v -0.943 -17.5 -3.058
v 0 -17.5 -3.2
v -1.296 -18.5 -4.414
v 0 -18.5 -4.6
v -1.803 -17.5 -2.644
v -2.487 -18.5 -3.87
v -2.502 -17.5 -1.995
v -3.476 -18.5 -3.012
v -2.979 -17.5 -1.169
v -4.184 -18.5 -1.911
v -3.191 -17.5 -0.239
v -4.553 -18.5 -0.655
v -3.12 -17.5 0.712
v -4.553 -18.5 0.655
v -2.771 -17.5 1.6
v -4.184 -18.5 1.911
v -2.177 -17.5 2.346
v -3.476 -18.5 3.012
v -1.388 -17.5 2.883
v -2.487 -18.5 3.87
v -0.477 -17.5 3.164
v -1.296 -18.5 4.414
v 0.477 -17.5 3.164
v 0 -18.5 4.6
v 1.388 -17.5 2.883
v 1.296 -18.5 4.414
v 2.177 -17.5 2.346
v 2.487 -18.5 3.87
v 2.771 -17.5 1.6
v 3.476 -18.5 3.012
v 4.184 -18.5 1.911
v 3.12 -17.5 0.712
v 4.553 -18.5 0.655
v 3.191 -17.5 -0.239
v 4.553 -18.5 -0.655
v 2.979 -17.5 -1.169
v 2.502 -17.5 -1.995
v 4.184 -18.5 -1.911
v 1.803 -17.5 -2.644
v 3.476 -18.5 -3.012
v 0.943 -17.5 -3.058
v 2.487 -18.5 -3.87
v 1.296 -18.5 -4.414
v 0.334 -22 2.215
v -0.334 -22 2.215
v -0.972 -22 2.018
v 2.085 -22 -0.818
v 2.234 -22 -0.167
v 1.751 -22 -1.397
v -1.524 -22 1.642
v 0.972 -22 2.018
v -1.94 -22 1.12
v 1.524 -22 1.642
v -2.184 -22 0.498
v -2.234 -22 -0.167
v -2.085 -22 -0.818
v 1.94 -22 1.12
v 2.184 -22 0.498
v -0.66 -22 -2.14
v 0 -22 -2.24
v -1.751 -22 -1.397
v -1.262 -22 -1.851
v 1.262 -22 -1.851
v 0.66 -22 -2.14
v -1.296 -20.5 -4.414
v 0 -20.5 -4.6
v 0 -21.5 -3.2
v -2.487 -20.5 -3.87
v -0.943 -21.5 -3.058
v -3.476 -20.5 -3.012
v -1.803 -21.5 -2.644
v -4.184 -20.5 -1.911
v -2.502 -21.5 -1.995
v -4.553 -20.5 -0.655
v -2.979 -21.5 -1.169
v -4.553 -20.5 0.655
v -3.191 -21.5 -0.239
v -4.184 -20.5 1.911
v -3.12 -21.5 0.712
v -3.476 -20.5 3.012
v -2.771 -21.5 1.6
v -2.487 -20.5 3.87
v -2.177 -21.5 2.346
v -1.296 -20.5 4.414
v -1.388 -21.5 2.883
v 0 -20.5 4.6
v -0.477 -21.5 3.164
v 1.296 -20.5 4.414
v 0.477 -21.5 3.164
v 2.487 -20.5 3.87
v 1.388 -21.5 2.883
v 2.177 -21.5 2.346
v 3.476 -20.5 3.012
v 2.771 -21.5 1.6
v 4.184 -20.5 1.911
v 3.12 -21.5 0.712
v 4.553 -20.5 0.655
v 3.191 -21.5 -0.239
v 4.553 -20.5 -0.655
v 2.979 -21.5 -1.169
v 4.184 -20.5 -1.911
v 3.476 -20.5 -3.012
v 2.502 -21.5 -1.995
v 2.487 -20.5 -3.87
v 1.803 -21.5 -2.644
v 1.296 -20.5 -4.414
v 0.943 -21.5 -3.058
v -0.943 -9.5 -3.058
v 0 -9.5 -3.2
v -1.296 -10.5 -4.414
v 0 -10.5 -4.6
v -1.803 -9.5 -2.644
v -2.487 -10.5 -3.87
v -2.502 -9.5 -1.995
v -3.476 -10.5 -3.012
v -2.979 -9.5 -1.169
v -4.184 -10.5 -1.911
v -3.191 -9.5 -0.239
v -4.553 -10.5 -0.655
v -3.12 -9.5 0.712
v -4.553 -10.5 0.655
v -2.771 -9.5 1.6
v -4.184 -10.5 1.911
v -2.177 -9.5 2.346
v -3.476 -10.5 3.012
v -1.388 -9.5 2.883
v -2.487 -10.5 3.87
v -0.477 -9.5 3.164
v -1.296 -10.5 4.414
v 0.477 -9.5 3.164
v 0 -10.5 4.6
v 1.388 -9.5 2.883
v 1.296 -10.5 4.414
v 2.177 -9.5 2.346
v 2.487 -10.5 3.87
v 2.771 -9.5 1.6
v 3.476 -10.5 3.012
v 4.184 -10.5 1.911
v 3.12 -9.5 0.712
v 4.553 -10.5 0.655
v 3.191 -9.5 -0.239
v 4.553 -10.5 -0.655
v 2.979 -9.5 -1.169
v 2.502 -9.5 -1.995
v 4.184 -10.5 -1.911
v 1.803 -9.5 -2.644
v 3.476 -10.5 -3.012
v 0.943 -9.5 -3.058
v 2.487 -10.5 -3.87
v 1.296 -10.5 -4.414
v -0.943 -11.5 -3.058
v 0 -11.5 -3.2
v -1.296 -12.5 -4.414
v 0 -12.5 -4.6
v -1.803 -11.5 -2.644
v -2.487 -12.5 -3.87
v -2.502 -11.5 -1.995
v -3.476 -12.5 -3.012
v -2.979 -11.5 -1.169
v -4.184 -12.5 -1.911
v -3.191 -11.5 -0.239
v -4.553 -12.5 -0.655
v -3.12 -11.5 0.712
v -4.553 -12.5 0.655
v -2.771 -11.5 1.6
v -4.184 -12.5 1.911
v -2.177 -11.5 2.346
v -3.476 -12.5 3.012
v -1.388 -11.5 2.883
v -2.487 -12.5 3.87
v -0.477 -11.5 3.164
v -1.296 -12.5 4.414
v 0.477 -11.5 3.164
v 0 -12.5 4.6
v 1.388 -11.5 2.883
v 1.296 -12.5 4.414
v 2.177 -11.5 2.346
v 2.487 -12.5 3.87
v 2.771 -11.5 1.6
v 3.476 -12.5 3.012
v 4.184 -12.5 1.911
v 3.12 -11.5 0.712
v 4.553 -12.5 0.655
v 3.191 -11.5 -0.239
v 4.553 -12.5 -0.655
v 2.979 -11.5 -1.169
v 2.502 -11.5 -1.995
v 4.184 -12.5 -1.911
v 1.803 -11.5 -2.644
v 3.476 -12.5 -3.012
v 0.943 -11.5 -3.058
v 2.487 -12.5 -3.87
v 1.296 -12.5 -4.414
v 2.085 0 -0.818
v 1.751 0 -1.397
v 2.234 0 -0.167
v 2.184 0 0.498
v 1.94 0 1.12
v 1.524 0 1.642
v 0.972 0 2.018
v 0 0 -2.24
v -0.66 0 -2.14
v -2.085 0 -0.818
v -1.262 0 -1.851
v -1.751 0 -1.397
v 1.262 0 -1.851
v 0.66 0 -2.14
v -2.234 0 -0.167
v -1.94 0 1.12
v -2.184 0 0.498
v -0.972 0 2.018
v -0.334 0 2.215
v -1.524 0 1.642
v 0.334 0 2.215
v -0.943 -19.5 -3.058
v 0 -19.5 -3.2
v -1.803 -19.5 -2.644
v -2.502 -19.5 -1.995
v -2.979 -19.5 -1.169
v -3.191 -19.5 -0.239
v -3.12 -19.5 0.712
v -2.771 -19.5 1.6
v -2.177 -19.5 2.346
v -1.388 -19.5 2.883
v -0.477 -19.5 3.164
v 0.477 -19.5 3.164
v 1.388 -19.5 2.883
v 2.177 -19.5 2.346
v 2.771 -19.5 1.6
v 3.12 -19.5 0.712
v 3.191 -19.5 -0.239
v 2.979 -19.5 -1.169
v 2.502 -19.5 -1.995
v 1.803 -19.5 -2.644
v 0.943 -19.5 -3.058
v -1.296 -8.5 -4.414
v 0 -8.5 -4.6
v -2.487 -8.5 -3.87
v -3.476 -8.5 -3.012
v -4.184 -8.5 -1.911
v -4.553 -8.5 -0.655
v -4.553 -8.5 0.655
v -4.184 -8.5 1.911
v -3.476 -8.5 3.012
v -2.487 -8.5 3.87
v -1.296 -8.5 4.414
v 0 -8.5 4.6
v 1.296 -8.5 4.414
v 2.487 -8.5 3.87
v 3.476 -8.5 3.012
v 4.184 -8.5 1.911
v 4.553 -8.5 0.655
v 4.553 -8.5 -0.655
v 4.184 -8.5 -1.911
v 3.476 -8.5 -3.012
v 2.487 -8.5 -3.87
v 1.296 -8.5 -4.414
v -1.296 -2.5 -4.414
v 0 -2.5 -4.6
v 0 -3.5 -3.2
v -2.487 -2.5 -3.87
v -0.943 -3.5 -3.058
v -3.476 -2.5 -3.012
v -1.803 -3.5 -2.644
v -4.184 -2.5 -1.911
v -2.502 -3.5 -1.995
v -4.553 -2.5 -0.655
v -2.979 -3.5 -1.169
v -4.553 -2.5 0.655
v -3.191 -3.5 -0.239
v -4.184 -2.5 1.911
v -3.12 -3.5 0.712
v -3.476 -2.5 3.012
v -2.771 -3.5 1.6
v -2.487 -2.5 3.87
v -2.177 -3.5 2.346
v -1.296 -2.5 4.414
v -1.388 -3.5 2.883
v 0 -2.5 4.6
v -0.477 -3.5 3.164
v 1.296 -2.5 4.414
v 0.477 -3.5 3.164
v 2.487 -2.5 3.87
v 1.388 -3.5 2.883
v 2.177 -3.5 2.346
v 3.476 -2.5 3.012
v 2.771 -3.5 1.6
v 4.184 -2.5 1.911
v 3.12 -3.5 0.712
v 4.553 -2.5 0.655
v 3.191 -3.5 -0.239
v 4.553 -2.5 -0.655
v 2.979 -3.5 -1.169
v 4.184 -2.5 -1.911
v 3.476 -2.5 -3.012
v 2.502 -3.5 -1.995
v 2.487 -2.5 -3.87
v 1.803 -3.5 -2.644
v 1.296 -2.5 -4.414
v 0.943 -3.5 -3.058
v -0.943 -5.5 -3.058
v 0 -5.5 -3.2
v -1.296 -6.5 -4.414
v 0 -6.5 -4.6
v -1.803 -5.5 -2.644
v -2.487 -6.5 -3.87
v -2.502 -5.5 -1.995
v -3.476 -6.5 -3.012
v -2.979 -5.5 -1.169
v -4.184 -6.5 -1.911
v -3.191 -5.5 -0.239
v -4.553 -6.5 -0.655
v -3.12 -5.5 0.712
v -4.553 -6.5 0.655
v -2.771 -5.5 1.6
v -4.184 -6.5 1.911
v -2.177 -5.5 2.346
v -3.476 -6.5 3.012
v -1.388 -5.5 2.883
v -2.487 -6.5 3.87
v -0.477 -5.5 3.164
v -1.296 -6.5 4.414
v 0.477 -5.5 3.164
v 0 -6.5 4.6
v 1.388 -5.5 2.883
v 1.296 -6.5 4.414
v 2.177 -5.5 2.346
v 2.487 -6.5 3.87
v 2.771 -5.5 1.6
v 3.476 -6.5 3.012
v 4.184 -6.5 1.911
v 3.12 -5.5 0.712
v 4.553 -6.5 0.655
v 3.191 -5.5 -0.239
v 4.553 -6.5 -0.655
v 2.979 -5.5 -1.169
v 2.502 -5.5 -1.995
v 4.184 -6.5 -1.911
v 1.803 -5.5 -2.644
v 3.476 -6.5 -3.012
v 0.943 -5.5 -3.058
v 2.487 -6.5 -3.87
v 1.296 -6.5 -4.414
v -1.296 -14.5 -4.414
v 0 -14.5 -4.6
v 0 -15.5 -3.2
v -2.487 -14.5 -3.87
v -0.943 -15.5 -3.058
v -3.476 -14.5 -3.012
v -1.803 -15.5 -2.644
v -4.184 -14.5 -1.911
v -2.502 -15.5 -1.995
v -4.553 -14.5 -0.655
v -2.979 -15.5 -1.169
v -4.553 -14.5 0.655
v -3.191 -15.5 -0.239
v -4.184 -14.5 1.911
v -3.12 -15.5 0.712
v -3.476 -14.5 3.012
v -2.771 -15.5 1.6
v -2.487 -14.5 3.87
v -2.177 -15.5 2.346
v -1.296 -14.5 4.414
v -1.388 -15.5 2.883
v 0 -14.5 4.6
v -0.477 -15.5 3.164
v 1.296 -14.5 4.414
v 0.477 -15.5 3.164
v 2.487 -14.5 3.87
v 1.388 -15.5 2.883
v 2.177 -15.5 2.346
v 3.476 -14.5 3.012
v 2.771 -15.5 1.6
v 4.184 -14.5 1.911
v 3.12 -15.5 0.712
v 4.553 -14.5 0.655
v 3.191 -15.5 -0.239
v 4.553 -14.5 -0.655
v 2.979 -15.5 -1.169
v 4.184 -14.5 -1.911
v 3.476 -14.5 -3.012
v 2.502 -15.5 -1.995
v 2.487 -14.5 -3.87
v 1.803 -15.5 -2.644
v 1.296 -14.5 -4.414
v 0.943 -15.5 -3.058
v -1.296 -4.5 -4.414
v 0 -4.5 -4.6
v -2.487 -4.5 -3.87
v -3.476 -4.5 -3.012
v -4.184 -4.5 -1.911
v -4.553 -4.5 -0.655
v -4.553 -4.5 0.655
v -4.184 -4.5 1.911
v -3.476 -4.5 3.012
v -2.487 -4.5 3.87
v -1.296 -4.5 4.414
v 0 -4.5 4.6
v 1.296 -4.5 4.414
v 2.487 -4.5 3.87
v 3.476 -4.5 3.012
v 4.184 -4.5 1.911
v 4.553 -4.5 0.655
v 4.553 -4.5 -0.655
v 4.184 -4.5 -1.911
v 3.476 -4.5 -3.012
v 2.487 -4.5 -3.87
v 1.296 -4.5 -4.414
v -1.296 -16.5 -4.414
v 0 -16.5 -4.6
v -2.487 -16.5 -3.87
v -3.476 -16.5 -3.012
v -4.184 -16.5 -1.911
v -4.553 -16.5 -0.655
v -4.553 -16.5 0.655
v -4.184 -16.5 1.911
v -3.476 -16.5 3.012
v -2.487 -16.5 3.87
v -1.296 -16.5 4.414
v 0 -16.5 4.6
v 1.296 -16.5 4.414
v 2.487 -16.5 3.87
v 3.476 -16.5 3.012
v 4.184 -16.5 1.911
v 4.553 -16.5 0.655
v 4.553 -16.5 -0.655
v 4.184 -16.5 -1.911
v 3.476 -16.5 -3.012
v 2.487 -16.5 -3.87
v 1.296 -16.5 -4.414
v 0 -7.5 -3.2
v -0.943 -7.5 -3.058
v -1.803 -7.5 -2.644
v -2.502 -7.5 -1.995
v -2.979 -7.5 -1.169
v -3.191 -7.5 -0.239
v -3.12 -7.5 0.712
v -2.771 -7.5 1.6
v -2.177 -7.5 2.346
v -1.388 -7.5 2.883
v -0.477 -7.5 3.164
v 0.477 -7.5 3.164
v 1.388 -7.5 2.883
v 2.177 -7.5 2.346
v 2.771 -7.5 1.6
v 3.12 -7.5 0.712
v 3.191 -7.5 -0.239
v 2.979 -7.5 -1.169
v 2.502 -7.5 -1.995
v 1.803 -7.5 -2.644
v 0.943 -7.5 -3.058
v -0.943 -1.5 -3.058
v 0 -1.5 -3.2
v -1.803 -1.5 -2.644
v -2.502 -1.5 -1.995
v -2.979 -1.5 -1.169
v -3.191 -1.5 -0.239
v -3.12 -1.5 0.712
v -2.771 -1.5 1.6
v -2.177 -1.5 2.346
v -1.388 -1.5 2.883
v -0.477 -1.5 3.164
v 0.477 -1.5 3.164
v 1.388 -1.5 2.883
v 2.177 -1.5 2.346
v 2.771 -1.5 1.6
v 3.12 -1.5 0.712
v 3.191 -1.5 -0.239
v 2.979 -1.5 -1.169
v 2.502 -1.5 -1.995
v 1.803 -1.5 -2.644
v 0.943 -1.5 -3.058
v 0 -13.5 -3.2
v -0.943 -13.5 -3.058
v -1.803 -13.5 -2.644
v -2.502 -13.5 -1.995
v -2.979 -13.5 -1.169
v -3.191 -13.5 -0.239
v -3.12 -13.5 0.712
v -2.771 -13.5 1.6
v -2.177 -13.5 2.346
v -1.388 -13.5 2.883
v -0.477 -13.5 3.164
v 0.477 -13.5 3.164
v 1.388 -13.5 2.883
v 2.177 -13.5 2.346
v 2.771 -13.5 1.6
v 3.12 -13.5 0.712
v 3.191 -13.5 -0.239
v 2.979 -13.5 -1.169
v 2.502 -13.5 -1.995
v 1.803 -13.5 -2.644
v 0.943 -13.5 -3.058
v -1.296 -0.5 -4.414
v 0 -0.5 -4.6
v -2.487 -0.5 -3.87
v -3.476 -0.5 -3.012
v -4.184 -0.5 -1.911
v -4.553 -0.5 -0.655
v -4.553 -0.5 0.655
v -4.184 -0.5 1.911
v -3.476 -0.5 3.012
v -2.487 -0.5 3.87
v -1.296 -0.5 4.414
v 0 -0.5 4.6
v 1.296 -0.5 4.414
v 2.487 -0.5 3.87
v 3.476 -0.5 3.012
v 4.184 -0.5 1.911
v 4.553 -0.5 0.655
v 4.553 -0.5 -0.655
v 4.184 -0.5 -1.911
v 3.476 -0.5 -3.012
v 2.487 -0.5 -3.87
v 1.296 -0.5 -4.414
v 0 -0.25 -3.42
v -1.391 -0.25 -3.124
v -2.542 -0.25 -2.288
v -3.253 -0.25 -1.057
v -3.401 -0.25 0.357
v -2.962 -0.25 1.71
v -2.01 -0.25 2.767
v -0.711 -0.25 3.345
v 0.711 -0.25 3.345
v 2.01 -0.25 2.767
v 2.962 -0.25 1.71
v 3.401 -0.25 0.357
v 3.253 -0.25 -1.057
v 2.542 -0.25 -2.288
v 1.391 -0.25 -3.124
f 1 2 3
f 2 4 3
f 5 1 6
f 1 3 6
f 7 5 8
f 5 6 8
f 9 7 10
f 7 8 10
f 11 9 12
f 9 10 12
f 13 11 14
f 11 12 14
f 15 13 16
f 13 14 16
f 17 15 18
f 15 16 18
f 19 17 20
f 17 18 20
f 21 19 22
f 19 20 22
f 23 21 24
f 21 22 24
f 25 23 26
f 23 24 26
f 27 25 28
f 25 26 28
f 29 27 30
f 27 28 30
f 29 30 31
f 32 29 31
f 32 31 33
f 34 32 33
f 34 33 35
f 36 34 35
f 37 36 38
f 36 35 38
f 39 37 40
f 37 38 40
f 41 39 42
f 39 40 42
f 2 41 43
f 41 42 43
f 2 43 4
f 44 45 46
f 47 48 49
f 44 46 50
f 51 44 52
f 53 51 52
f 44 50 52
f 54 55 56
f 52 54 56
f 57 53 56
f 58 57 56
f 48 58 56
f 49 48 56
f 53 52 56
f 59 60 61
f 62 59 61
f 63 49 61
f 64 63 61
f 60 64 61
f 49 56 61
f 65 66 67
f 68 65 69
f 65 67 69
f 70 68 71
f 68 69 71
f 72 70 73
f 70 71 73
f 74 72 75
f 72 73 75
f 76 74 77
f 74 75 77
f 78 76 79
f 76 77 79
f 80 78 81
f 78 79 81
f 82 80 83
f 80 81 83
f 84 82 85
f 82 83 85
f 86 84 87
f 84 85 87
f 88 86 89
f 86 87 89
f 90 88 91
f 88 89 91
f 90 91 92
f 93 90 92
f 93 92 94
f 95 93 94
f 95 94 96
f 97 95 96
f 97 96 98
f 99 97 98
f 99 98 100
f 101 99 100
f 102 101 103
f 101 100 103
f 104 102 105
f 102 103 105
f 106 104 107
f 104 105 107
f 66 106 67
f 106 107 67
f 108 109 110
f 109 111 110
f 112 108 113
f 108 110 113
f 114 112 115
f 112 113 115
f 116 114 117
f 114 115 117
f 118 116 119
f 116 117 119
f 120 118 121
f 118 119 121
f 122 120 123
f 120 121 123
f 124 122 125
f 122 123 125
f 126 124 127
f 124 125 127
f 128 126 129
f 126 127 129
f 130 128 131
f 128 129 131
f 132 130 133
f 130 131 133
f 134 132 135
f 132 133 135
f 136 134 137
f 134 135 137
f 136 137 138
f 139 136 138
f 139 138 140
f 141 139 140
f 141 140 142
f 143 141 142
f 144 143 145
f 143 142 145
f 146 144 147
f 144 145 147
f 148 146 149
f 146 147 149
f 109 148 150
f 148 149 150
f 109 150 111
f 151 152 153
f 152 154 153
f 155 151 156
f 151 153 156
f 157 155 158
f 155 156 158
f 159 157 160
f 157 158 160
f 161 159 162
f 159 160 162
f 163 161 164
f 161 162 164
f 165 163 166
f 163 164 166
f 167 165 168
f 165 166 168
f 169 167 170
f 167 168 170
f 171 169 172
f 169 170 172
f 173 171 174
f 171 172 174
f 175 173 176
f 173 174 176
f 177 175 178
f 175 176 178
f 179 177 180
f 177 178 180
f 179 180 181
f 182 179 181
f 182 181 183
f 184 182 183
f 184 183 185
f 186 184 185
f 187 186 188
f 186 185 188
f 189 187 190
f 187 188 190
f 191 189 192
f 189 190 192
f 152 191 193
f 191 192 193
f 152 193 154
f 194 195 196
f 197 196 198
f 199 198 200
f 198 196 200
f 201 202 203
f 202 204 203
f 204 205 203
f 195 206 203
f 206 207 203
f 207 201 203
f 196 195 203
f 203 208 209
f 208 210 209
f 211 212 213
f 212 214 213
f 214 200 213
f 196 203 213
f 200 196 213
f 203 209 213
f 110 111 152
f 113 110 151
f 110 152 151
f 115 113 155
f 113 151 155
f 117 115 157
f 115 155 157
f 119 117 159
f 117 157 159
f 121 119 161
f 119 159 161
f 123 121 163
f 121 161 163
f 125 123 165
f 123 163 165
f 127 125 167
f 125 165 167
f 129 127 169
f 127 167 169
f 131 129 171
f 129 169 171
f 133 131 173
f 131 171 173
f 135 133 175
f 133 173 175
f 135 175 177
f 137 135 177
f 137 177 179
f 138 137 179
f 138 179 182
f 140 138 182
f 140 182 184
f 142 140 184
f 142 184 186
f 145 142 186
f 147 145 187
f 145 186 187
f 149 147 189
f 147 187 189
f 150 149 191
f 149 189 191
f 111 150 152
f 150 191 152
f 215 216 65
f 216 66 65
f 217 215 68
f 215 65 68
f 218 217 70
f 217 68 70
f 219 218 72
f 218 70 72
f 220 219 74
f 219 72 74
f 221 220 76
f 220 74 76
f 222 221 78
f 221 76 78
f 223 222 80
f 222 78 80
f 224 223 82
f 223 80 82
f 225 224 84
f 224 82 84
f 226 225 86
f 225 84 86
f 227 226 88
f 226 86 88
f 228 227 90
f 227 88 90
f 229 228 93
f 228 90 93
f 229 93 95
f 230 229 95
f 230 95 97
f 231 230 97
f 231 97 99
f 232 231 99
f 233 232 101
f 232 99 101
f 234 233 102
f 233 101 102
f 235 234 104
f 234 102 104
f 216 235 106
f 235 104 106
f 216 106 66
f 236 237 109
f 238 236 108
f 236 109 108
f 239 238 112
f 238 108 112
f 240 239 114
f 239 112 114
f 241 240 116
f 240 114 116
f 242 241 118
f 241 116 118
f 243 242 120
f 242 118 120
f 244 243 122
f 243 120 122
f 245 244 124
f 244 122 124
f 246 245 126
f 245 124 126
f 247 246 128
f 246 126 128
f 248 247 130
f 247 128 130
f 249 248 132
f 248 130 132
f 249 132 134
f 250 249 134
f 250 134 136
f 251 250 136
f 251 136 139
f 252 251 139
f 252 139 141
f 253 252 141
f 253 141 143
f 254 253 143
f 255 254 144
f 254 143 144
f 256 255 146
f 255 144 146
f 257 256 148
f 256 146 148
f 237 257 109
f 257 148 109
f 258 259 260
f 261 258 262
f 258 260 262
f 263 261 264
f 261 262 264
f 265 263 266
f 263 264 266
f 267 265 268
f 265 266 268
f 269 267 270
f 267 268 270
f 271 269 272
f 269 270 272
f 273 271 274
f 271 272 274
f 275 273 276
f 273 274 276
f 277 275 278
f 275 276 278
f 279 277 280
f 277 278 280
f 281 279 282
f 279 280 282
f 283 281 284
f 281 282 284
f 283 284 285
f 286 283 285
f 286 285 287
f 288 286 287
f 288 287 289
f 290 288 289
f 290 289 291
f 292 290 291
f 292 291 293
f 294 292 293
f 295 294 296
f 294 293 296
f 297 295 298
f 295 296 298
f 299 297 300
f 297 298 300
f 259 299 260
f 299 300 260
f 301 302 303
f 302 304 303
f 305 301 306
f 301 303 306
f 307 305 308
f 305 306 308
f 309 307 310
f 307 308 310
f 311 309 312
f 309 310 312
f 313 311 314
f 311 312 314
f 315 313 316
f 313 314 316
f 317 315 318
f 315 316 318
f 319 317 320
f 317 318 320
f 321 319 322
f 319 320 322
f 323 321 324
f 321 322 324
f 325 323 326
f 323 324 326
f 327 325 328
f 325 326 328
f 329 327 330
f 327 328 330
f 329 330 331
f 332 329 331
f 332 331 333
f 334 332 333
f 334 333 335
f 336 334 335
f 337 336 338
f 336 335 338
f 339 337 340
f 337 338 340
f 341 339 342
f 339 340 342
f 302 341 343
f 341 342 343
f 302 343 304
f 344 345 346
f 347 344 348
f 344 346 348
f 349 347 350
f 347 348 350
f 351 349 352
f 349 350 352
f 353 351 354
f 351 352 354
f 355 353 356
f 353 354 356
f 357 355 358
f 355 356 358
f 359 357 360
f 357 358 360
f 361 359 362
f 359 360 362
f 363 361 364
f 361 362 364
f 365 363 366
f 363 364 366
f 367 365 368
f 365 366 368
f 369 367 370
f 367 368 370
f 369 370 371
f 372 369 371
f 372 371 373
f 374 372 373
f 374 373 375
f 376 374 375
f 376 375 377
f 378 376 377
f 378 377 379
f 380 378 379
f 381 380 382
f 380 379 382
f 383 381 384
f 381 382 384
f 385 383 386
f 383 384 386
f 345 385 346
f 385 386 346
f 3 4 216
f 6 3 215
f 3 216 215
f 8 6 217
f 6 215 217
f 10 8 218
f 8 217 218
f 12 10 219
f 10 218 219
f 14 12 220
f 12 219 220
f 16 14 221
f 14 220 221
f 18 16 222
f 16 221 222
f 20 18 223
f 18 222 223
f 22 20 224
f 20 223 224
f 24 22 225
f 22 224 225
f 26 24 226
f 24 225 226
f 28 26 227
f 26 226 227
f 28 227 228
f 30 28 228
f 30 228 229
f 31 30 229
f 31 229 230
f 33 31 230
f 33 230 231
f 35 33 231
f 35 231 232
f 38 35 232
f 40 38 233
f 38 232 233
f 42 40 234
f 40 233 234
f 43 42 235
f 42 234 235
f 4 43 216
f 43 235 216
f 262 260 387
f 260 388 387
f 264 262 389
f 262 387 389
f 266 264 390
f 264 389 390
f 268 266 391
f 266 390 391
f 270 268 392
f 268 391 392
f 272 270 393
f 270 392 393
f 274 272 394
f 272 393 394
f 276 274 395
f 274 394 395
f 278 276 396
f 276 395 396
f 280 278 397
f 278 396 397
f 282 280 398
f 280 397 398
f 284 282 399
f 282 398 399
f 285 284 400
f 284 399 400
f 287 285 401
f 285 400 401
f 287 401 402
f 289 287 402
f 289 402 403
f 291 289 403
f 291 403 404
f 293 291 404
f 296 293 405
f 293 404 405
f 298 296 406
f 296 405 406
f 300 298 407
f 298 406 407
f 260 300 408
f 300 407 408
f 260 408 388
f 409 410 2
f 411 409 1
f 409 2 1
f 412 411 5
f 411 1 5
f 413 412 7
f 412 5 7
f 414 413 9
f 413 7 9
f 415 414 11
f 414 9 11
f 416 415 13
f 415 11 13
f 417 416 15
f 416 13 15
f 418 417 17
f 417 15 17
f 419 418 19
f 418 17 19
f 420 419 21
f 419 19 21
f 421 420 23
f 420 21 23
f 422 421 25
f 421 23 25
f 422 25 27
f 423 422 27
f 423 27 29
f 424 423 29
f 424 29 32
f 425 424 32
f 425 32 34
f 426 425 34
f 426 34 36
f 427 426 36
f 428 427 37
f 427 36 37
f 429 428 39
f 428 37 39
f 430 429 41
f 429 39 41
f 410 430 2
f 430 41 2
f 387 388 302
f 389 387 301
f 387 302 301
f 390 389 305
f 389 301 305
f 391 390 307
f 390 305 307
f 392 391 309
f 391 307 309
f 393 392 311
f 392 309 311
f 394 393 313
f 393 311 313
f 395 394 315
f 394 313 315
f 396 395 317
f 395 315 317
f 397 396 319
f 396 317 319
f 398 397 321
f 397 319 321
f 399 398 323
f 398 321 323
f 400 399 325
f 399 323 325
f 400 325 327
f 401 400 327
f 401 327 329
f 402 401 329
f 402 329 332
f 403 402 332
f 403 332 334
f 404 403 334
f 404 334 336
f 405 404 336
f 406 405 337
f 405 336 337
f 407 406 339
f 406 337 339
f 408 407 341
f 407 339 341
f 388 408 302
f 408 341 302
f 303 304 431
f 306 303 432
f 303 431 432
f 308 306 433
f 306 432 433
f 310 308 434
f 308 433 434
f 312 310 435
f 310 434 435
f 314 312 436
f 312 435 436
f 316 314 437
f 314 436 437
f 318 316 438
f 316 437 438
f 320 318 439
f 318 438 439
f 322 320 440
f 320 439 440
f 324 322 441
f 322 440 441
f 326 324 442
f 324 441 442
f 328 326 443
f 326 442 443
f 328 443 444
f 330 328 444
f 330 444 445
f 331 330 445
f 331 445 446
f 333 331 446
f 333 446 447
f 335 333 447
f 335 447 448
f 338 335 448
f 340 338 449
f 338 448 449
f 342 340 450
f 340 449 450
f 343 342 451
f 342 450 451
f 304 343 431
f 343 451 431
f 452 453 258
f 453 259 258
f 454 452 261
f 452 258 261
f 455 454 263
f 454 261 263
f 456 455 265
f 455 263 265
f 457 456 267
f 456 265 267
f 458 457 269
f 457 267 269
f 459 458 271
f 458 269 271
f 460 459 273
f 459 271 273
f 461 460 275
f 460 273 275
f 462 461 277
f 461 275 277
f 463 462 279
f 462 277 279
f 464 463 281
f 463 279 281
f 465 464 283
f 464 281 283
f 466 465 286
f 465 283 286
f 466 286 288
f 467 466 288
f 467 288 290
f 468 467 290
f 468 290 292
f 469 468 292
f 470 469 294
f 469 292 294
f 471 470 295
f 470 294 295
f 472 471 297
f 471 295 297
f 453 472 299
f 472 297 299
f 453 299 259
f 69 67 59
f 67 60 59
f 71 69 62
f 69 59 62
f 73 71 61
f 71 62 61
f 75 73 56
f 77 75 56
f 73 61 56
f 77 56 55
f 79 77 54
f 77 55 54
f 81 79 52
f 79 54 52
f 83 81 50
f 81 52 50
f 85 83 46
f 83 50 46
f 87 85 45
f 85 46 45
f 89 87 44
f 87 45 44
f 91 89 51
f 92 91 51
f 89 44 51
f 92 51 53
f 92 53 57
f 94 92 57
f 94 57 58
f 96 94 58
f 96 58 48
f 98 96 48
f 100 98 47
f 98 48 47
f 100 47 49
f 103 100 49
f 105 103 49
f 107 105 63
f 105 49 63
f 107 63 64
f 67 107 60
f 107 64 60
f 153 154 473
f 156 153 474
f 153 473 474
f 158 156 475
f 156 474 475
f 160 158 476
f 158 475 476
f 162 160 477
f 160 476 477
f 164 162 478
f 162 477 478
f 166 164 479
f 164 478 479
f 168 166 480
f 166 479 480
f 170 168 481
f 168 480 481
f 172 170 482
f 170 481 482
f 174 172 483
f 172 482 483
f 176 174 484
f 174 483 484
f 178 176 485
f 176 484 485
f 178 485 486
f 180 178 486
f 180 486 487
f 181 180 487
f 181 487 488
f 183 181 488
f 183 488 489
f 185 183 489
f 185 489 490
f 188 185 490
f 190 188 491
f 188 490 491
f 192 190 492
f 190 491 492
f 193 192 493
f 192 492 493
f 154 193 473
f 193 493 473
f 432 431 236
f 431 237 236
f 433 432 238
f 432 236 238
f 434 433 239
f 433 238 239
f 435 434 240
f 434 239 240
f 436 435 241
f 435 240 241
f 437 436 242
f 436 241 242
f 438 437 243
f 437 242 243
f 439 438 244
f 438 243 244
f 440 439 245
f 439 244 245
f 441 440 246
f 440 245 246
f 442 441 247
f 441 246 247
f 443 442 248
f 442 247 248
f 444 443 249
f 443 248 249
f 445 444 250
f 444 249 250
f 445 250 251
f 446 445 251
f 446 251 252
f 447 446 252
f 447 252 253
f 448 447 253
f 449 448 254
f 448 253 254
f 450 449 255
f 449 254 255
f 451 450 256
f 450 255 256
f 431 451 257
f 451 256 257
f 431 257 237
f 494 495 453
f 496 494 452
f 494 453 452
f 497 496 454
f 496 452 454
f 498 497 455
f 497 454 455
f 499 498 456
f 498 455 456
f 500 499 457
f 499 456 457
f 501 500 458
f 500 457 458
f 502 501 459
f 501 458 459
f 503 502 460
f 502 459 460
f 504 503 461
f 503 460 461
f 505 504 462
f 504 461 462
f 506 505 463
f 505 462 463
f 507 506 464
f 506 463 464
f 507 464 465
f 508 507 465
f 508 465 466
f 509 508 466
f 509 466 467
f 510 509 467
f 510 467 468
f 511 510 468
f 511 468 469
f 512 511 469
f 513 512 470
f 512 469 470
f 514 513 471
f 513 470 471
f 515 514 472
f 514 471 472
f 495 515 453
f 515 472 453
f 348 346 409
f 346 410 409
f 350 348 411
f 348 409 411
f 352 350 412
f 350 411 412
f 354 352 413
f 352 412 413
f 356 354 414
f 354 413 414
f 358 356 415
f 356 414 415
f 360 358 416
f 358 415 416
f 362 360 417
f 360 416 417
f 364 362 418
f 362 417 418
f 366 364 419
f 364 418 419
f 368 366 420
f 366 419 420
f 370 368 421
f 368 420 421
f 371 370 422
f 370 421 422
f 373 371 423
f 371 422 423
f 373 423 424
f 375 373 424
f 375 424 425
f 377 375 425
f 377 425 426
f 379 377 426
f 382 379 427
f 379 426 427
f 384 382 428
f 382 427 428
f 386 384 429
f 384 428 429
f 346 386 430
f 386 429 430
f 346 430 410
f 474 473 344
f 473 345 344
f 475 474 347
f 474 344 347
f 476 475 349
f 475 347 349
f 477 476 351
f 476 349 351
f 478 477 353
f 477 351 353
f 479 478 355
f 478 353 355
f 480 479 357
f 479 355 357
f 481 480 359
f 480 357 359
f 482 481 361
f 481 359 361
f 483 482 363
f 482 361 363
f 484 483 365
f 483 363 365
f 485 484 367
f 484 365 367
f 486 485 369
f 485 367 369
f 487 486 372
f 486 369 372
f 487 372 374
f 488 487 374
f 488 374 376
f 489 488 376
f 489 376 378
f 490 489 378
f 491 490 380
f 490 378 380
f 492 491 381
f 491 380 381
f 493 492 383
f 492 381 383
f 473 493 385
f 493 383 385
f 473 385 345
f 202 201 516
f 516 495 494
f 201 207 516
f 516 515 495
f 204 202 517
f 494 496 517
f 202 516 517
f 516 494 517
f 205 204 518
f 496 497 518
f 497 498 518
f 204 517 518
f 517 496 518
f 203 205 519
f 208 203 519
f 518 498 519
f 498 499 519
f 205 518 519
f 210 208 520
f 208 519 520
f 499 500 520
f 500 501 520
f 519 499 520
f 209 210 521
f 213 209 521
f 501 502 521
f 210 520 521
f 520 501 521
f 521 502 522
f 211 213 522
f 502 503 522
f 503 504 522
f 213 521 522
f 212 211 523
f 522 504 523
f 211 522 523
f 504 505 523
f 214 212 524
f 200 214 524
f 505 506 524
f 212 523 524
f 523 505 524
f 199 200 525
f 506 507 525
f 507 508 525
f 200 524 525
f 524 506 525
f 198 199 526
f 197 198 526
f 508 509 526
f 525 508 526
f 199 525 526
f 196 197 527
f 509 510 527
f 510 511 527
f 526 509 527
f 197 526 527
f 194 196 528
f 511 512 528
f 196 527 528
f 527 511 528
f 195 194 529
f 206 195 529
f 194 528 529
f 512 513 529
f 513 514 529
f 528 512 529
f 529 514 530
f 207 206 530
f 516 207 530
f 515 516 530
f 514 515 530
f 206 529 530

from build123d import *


with BuildPart() as part:
    # Sketch1 → Elemento_elastico_en_serie (revolve)
    with BuildSketch(Plane.XY, mode=Mode.PRIVATE) as elemento_elastico_en_serie_sk:
        Polygon((0, 0), (2.24, 0), (4.6, -0.5), (3.2, -1.5), (4.6, -2.5), (3.2, -3.5), (4.6, -4.5), (3.2, -5.5), (4.6, -6.5), (3.2, -7.5), (4.6, -8.5), (3.2, -9.5), (4.6, -10.5), (3.2, -11.5), (4.6, -12.5), (3.2, -13.5), (4.6, -14.5), (3.2, -15.5), (4.6, -16.5), (3.2, -17.5), (4.6, -18.5), (3.2, -19.5), (4.6, -20.5), (3.2, -21.5), (2.24, -22), (0, -22), align=None)
    revolve(elemento_elastico_en_serie_sk.sketch.rotate(Axis((0, -26, 0), (0, 1, 0)), 90), axis=Axis((0, -26, 0), (0, 1, 0)))


solid = part.part
